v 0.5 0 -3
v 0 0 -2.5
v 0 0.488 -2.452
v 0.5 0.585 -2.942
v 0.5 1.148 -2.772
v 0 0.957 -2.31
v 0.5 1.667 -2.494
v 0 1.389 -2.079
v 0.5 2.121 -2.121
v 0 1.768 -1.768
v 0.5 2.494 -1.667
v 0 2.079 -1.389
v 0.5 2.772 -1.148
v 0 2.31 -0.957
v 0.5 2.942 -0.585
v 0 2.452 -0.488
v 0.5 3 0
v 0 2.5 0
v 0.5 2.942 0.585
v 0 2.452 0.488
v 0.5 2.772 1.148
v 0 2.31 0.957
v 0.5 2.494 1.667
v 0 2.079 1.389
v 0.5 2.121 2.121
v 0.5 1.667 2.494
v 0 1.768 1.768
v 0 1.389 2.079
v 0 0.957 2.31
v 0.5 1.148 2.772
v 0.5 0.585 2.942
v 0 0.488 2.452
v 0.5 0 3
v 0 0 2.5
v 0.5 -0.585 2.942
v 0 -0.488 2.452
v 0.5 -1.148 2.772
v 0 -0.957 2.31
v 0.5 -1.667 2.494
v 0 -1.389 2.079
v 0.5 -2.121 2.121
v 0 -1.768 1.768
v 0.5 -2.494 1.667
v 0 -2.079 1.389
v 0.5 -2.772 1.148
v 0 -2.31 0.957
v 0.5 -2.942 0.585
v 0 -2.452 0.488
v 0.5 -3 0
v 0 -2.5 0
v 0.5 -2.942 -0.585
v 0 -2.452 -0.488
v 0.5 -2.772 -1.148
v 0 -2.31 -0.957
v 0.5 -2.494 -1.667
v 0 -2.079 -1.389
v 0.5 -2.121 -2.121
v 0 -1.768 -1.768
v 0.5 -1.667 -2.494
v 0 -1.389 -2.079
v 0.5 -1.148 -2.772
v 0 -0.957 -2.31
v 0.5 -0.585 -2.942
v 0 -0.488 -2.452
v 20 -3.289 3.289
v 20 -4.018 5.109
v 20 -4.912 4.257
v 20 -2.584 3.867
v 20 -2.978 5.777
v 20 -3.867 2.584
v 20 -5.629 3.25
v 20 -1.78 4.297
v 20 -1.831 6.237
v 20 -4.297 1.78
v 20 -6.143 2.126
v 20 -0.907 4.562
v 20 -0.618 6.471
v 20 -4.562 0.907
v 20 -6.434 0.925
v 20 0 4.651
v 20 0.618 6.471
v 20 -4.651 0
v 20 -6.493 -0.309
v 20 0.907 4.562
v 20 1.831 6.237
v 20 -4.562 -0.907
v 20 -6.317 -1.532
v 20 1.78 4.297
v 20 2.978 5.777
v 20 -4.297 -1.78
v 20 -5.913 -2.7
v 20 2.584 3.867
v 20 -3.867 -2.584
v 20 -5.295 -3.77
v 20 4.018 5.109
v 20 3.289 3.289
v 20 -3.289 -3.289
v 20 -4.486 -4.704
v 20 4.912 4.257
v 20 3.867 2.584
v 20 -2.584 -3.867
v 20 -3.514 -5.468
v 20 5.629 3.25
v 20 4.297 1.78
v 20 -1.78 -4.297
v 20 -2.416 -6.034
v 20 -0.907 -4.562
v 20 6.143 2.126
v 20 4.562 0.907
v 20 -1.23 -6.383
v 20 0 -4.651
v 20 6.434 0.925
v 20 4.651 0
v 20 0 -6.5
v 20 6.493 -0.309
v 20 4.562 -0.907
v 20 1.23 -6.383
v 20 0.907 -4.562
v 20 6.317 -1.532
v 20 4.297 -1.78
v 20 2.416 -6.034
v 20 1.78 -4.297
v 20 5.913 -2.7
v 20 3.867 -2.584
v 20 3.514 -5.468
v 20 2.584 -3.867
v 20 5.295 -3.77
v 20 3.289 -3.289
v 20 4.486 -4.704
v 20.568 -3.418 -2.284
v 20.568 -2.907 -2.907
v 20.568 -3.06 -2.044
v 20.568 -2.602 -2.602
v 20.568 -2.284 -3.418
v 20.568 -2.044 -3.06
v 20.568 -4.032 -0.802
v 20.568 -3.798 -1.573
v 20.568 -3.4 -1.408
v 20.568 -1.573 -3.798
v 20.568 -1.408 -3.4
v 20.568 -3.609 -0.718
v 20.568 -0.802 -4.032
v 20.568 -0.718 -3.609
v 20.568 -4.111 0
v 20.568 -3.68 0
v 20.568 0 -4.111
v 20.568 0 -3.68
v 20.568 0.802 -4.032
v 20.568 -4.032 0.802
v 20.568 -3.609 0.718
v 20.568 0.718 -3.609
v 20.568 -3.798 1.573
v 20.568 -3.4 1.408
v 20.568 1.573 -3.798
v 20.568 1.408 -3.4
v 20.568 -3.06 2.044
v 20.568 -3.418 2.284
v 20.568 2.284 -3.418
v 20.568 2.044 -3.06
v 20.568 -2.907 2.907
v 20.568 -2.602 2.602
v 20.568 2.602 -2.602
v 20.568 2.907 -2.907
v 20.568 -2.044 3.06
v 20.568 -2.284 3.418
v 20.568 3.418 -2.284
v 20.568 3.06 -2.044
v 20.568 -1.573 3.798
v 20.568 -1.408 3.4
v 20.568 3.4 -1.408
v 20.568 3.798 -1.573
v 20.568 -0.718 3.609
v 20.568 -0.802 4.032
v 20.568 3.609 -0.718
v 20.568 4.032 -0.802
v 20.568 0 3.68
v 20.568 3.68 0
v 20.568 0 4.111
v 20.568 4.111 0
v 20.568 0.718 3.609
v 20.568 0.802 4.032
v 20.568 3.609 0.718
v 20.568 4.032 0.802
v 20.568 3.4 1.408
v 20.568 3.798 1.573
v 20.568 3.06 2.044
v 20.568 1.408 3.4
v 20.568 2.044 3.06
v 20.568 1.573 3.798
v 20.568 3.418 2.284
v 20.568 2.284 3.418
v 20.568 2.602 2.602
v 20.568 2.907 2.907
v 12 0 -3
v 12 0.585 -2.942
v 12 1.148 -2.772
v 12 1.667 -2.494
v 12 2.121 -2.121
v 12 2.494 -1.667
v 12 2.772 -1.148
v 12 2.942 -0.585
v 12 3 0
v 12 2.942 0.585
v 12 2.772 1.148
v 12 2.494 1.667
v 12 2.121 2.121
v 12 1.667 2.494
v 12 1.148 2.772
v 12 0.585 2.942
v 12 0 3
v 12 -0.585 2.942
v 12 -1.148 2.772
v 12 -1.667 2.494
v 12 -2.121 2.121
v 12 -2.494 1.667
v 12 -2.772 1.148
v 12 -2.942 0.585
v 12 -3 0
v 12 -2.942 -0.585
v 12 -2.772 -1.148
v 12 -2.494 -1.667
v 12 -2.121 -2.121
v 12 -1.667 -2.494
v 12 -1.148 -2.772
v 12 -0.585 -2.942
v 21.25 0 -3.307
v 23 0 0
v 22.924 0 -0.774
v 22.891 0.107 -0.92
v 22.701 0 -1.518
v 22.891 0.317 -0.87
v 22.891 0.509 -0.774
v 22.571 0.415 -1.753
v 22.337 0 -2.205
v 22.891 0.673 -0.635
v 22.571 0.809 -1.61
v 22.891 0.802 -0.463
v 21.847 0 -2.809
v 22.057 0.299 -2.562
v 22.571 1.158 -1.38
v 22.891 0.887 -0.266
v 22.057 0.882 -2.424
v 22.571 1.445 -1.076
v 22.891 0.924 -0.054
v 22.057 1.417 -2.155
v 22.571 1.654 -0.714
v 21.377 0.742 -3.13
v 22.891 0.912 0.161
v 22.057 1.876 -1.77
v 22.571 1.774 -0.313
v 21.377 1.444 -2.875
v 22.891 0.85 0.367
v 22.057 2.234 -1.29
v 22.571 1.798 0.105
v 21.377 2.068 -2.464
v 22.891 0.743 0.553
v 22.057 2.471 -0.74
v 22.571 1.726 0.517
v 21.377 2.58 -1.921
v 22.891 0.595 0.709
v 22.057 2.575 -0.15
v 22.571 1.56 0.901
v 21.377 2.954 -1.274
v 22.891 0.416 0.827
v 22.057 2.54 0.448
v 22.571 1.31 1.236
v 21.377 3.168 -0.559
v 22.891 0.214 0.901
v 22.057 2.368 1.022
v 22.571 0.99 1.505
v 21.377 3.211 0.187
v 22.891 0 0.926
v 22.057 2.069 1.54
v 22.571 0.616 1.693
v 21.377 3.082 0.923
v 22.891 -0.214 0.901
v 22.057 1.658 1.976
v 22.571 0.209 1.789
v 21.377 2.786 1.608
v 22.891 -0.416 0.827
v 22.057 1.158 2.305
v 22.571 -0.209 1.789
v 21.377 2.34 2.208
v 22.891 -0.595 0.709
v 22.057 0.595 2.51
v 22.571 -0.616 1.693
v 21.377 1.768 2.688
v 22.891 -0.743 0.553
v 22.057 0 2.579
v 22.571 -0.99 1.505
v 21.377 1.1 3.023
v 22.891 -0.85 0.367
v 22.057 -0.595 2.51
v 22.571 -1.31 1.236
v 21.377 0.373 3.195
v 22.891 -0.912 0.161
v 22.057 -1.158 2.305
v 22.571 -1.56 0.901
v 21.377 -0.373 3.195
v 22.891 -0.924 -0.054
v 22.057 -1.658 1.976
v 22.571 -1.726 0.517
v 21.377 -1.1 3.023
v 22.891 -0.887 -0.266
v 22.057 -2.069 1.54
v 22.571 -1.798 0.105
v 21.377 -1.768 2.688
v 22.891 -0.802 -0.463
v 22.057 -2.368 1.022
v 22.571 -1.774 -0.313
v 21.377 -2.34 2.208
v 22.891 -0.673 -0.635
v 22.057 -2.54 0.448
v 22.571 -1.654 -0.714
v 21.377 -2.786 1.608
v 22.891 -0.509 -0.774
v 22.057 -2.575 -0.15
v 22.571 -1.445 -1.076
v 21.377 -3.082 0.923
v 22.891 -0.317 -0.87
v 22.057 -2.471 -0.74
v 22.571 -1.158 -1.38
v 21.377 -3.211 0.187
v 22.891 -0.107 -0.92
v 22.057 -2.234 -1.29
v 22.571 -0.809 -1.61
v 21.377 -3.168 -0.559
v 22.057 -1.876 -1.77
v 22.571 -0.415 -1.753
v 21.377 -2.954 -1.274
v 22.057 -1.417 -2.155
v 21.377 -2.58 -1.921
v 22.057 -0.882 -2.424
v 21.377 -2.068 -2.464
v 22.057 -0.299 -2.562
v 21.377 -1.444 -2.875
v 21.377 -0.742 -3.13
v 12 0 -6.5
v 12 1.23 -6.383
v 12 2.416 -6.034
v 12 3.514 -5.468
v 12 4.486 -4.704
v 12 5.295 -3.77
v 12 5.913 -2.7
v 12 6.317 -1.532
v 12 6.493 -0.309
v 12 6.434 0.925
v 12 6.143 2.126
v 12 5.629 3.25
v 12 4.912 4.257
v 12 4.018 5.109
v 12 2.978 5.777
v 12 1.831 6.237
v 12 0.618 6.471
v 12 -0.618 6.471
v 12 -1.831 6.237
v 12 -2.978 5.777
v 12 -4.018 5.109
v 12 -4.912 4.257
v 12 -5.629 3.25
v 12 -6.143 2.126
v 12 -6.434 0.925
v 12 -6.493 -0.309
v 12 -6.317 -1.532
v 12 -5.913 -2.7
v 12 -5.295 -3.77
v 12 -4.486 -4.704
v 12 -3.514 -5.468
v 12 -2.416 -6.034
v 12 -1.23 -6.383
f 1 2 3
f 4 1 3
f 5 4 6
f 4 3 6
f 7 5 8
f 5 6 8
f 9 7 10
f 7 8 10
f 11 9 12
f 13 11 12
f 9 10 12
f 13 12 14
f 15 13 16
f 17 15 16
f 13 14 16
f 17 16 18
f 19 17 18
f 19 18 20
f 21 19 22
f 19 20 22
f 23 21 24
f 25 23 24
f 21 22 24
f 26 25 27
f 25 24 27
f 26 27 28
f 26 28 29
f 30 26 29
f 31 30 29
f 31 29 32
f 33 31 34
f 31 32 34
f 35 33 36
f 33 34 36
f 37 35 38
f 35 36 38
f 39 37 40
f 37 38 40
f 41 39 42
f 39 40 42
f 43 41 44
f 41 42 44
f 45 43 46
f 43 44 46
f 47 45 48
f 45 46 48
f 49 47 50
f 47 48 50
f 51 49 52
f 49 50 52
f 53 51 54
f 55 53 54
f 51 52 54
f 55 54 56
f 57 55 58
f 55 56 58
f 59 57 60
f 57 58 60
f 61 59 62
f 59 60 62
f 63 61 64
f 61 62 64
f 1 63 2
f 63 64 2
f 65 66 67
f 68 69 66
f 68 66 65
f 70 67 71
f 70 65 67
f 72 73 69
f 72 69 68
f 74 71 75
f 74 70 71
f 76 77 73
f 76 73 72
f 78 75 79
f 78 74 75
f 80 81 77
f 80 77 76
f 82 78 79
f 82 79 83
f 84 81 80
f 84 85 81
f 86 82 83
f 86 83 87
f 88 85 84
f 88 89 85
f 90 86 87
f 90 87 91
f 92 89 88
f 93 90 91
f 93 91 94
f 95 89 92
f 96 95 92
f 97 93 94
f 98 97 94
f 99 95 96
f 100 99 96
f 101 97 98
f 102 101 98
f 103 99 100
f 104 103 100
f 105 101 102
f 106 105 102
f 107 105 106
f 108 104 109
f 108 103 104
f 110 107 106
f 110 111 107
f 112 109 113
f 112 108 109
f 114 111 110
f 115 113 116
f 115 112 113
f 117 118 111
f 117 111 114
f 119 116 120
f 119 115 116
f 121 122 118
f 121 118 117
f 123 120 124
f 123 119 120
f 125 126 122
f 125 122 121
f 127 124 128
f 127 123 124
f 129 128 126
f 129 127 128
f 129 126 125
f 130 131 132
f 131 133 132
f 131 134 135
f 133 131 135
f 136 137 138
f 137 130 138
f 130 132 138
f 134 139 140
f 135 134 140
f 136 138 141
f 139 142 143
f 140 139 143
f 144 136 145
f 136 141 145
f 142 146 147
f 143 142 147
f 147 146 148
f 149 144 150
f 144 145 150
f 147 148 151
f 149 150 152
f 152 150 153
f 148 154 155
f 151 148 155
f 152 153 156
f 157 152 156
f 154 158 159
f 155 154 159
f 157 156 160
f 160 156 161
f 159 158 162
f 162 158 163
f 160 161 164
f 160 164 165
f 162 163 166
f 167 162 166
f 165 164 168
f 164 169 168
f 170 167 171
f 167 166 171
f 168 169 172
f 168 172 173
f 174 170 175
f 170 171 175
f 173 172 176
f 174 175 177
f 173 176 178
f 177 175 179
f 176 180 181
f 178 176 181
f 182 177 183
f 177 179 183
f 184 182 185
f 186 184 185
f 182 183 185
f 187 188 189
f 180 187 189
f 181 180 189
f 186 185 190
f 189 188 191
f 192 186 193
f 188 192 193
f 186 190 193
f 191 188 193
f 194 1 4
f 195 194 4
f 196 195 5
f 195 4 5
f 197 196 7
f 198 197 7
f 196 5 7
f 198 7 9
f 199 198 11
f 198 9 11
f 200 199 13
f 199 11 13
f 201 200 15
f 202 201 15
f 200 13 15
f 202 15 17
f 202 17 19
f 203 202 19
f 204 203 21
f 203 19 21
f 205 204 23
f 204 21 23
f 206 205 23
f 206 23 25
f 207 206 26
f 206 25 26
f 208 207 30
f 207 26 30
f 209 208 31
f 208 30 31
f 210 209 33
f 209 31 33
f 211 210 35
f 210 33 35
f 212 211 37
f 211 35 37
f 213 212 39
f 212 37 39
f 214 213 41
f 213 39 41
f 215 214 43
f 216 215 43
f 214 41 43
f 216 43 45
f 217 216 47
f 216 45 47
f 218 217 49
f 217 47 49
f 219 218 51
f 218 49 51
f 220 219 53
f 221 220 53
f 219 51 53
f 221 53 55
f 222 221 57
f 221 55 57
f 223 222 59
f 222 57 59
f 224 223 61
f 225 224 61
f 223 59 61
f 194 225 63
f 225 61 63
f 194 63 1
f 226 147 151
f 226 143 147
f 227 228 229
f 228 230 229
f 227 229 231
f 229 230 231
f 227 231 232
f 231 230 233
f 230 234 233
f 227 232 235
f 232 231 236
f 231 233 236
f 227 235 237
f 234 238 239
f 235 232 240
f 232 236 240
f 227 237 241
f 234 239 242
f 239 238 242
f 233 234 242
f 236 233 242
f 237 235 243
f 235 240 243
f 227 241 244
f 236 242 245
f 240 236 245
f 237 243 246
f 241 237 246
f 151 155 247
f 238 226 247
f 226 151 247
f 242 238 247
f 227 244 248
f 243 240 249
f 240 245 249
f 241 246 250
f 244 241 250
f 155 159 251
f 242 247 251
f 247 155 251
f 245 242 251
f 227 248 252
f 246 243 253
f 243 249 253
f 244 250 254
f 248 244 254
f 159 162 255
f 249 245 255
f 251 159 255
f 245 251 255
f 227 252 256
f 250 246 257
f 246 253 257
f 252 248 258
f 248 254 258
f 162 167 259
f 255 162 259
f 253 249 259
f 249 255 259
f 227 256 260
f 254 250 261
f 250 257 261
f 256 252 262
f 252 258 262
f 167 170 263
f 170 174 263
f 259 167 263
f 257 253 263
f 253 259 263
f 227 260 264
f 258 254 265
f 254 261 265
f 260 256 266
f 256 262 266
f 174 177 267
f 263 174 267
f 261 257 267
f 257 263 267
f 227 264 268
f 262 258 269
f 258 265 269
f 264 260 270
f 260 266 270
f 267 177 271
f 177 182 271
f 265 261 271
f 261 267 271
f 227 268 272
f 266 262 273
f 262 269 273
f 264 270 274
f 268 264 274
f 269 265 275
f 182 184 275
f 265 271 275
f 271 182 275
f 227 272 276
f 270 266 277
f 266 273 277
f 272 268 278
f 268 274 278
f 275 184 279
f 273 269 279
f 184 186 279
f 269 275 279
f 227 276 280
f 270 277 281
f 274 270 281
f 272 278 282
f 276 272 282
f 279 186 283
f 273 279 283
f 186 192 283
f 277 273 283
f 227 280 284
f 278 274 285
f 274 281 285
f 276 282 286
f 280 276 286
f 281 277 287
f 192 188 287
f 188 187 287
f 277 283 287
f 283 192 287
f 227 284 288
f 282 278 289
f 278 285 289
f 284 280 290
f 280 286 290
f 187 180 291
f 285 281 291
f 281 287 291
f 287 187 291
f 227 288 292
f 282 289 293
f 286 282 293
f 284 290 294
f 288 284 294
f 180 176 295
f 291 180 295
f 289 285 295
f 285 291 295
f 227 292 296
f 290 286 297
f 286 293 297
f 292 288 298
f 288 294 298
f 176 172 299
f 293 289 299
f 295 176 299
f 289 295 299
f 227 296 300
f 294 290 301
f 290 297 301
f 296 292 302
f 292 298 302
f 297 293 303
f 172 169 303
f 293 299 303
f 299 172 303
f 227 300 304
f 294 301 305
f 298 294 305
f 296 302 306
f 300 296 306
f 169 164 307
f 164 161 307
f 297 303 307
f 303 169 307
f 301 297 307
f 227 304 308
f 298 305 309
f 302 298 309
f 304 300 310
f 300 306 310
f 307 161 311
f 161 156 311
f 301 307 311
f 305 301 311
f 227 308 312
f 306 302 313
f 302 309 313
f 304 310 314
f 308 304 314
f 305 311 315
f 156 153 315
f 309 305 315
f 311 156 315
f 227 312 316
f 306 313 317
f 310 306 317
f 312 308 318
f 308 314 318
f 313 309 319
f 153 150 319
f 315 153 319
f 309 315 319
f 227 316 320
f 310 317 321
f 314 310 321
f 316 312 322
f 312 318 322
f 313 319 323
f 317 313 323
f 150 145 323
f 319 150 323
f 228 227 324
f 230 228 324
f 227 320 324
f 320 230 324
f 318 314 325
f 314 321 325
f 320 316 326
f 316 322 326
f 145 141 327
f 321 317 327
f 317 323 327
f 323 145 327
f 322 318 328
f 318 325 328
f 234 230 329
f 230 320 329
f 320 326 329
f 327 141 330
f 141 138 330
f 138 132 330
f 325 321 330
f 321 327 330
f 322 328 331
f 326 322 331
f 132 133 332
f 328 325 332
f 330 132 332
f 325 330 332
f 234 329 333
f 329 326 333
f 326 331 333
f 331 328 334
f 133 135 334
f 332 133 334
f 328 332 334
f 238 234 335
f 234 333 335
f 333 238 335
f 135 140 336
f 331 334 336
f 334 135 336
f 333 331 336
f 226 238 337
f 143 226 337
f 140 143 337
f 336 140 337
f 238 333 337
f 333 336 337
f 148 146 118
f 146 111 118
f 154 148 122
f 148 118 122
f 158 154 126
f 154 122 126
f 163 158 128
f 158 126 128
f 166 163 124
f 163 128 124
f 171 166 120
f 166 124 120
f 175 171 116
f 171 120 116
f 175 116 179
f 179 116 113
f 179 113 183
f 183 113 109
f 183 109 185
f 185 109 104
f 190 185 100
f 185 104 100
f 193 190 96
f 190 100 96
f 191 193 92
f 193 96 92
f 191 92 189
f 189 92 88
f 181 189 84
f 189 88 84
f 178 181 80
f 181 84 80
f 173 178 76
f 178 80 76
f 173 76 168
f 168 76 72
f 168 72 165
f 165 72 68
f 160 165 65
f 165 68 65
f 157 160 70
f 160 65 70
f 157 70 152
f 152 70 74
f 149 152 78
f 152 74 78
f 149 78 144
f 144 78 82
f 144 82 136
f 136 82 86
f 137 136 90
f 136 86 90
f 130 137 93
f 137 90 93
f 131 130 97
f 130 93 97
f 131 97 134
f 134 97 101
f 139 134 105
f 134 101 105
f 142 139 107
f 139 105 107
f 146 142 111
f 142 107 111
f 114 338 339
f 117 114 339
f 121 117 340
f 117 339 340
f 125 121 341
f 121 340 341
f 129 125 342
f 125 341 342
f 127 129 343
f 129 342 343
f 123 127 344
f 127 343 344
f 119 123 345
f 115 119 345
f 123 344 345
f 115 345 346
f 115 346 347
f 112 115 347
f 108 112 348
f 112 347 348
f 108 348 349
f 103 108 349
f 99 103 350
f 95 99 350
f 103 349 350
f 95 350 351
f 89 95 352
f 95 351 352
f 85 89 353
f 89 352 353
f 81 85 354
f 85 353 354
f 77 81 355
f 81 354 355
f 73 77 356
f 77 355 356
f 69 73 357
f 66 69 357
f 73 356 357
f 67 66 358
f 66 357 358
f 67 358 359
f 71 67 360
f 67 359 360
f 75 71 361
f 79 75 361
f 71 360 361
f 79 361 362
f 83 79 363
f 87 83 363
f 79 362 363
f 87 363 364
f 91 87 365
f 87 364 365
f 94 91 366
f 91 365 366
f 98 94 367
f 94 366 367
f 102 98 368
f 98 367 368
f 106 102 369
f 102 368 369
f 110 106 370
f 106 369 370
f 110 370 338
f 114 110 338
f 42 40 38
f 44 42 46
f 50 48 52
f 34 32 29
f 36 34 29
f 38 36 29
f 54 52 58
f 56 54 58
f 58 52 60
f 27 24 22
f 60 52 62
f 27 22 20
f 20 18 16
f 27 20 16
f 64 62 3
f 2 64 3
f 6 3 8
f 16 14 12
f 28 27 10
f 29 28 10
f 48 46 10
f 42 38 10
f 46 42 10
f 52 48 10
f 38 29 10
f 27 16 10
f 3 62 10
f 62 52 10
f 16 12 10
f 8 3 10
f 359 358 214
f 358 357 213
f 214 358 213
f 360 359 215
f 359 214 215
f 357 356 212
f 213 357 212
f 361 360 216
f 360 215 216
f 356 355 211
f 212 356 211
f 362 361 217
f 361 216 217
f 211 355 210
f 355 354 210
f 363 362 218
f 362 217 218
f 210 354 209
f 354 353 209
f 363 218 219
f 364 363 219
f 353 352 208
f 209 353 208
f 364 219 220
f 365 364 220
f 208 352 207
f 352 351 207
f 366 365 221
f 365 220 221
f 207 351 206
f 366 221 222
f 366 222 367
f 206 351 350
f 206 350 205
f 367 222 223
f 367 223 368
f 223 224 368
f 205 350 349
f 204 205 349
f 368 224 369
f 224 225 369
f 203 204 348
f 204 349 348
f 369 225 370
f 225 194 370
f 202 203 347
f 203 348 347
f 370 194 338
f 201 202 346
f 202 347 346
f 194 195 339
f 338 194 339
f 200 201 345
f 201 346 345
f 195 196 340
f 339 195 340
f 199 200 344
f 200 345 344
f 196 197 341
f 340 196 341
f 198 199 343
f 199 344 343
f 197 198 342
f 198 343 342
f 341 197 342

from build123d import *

# Parameters (mm, degrees)
SKETCH_1_R      = 3
EXTRUDE_1_DEPTH = 12
SKETCH_2_R      = 6.5
EXTRUDE_2_DEPTH = 8
CHAMFER_1_SIZE  = 0.5


with BuildPart() as part:
    # 草图1 → 凸台-拉伸1 (new body)
    with BuildSketch(Plane(origin=(0, 0, 0), x_dir=(0, 0, -1), z_dir=(1, 0, 0))):
        Circle(SKETCH_1_R)
    extrude(amount=EXTRUDE_1_DEPTH)

    # 草图2 → 凸台-拉伸2 (add)
    with BuildSketch(Plane(origin=(12, 0, 0), x_dir=(0, 0, -1), z_dir=(1, 0, 0))):
        Circle(SKETCH_2_R)
    extrude(amount=EXTRUDE_2_DEPTH)

    # 草图3 → 旋转2 (revolve)
    with BuildSketch(Plane(origin=(0, 0, 0), x_dir=(1, 0, 0), z_dir=(0, 1, 0))):
        with BuildLine():
            Line((15, 0), (23, 0))
            ThreePointArc((23, 0), (22.337104701, 2.20538709), (20.568133892, 3.679803812))
            Line((20.568133892, 3.679803812), (20.568133892, 4.110994158))
            Line((20.568133892, 4.110994158), (20, 4.650865374))
            Line((20, 4.650865374), (20, 3.872983346))
            ThreePointArc((20, 3.872983346), (16.550510257, 3.16227766), (15, 0))
        make_face()
    revolve(axis=Axis((15, 0, 0), (1, 0, 0)))

    # 倒角1
    chamfer_1_edges = [part.edges().sort_by_distance(p)[0] for p in [
        (0, 0, 3),
    ]]
    chamfer(chamfer_1_edges, length=CHAMFER_1_SIZE)


solid = part.part
